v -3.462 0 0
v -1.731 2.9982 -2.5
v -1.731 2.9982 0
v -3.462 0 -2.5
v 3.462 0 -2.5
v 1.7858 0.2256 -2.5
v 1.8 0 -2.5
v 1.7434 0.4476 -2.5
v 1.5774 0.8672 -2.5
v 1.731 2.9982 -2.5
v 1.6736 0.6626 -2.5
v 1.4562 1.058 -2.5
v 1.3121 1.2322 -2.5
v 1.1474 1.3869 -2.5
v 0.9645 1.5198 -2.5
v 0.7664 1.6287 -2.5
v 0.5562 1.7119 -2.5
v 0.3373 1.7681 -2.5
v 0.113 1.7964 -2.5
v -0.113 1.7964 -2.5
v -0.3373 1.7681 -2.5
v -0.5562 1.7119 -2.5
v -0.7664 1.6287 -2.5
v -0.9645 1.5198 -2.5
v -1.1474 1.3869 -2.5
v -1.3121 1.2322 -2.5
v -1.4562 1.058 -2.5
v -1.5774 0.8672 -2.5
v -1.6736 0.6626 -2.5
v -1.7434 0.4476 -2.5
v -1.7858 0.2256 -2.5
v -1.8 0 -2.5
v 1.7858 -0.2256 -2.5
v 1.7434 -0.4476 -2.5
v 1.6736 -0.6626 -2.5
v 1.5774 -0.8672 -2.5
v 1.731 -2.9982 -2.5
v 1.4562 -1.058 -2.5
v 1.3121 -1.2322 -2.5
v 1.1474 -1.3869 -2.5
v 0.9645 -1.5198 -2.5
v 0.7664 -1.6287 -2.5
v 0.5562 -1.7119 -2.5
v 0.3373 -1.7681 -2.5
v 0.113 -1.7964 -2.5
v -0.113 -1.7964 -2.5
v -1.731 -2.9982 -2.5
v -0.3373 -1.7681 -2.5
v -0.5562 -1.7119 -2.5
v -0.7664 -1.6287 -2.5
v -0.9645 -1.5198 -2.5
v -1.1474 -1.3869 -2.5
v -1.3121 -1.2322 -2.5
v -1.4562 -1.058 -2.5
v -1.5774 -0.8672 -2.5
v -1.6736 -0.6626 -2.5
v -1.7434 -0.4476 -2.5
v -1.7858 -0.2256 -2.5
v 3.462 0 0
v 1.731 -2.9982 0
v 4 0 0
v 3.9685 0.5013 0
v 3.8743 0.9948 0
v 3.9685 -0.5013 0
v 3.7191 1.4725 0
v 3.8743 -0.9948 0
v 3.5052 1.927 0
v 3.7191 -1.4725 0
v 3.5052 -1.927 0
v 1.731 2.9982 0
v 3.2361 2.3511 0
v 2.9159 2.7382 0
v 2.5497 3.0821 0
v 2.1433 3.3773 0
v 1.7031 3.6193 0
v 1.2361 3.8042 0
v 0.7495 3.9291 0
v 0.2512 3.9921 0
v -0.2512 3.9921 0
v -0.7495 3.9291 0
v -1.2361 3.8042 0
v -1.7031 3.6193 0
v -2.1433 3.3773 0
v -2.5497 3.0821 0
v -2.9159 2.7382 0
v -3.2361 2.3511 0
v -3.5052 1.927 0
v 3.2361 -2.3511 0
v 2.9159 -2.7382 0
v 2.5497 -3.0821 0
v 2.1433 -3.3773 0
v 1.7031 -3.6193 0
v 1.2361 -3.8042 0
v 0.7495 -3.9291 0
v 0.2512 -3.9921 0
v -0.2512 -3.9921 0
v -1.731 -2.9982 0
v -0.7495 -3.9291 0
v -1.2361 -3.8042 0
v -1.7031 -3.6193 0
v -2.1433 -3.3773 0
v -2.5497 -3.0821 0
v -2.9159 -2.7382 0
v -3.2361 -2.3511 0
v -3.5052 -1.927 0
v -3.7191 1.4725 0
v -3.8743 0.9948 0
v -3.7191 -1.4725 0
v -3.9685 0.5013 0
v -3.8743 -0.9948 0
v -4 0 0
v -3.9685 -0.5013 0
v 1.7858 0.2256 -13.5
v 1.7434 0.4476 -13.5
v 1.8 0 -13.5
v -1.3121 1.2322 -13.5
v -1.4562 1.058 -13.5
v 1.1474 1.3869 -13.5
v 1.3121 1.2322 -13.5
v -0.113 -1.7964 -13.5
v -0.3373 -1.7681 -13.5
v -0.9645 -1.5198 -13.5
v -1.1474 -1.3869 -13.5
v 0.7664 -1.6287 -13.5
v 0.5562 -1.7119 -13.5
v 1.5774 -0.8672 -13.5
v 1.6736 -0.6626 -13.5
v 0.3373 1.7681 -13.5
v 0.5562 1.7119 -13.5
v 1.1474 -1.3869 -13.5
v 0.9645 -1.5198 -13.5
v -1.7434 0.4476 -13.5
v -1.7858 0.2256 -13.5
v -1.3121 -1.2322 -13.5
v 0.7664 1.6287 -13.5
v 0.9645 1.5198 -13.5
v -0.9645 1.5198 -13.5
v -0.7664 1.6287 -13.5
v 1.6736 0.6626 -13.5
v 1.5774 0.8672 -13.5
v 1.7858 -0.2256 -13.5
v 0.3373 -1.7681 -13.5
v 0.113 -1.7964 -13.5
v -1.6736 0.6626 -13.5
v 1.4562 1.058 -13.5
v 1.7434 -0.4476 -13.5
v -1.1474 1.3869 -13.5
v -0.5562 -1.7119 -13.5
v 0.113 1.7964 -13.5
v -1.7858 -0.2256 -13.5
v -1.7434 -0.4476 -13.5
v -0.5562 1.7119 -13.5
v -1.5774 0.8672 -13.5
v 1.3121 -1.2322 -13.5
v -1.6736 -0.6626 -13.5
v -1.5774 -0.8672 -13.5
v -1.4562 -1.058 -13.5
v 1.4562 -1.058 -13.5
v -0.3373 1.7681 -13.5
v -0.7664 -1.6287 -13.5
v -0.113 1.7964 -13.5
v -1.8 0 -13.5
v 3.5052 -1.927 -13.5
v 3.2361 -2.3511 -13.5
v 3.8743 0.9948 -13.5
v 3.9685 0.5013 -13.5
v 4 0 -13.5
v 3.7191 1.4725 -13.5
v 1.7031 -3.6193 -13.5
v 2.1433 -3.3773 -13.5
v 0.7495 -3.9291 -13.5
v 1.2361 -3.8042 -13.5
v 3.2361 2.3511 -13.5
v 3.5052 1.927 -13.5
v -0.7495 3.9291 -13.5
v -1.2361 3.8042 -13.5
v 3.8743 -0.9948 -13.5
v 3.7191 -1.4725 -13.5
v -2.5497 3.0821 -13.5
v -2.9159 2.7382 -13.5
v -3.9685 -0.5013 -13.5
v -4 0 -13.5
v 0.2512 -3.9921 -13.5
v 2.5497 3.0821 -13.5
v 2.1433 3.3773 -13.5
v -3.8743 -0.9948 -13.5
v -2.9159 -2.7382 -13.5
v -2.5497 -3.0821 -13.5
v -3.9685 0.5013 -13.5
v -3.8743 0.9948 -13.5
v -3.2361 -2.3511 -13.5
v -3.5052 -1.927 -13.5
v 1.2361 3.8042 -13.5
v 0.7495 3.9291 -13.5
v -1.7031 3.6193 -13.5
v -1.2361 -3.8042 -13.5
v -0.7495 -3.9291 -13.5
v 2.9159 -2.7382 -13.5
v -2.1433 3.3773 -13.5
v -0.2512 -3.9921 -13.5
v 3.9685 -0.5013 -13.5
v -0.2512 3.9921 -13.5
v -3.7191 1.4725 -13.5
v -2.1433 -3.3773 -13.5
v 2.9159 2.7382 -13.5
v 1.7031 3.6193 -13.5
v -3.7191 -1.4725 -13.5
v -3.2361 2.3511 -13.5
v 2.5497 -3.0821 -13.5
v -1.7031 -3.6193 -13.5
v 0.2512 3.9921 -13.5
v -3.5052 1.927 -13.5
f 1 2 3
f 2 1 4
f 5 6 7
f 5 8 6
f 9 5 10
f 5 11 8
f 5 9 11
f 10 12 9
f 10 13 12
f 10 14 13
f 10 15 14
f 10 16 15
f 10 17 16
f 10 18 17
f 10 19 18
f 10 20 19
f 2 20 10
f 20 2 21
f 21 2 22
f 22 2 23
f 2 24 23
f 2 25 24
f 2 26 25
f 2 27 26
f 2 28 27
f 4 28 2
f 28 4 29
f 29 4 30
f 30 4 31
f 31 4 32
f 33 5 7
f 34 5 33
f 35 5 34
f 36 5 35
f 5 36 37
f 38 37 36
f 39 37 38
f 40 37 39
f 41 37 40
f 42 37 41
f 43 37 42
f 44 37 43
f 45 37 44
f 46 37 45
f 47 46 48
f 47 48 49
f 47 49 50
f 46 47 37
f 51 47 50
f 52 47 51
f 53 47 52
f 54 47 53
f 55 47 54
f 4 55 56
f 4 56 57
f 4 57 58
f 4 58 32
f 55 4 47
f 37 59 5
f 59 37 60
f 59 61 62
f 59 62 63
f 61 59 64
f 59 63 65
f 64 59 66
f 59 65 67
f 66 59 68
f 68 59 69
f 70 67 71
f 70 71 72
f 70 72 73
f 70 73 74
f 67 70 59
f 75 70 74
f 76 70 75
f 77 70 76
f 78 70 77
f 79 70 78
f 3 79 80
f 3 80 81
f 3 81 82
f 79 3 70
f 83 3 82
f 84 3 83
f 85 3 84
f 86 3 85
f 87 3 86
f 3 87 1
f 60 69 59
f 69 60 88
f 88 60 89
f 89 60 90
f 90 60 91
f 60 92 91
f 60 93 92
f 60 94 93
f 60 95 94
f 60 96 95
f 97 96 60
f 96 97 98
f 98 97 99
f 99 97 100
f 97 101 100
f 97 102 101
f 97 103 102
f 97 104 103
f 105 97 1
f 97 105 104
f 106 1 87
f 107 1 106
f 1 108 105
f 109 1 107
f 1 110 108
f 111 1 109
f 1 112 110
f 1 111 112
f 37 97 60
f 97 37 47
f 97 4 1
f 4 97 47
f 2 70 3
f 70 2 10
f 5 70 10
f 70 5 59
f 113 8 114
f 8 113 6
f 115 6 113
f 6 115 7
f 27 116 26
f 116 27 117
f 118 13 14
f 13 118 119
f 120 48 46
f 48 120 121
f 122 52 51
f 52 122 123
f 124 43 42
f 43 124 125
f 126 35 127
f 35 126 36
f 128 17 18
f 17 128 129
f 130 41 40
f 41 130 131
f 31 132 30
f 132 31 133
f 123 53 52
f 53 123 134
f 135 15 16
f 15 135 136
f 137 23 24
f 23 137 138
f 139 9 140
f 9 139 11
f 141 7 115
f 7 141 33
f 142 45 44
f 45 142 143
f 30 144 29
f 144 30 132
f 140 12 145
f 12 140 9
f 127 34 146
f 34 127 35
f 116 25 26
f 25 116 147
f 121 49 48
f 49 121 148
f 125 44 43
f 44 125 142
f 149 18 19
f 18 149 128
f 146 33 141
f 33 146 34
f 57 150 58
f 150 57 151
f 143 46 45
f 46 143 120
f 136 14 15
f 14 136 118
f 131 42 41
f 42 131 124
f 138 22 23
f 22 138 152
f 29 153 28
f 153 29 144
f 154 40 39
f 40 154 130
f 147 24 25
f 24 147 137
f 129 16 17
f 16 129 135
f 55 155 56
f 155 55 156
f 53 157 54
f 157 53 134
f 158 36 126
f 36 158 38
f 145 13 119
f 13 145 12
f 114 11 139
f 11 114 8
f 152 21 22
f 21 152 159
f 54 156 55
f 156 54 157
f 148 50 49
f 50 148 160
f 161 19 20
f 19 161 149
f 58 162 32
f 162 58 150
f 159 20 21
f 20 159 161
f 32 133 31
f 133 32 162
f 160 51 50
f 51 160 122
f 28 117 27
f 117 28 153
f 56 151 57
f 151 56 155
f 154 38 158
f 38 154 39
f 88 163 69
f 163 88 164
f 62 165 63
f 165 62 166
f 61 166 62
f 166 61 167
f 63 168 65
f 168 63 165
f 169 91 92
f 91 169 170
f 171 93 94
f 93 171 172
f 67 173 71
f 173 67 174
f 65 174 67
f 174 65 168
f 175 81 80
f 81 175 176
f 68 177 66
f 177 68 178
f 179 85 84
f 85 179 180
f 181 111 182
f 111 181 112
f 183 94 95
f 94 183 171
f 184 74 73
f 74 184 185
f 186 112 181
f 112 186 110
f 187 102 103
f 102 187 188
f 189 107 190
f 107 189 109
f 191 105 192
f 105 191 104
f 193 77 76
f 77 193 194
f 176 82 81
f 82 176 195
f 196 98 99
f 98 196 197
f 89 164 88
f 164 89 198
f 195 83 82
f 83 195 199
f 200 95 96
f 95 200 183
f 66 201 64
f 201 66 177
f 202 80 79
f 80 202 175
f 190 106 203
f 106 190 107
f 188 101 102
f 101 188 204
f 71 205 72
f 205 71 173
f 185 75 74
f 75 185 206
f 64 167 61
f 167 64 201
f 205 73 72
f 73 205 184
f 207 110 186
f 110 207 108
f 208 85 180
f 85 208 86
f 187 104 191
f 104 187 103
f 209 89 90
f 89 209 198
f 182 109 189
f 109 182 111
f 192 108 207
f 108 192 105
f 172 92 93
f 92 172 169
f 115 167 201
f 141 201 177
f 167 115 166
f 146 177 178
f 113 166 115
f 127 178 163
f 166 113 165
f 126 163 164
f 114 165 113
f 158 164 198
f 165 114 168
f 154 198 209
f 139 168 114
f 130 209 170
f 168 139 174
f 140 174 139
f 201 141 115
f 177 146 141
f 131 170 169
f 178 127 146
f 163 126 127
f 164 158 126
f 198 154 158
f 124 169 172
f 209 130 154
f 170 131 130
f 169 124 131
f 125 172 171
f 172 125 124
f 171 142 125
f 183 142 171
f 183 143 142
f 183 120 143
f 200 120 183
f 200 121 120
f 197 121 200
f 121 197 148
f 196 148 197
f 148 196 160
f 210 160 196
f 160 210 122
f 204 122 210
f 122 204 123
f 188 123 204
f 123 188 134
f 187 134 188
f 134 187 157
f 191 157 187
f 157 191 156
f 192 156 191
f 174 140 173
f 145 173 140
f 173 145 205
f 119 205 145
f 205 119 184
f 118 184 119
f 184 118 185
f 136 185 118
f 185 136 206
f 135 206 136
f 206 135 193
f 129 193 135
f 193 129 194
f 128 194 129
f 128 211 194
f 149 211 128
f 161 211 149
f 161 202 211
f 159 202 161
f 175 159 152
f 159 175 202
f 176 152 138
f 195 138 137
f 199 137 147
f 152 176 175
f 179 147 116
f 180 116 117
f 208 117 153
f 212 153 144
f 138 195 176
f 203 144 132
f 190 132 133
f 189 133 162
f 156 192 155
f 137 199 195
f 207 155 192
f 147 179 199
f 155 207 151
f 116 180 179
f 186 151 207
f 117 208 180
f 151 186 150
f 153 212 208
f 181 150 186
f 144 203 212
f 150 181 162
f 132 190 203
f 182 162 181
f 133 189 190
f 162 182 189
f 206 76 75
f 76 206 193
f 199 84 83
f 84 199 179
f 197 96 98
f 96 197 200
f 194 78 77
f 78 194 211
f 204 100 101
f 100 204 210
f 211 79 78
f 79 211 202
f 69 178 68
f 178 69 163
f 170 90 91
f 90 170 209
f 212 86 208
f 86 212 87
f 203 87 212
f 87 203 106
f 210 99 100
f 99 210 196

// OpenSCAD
$fn = 50;

difference() {
	union() {
		translate(v = [0, 0, -13.5]) {
			cylinder(h = 13.5, r = 4.0);
		}
	}
	union() {
		translate(v = [0, 0, 0]) {
			rotate(a = [0, 0, 0]) {
				difference() {
					union() {
						translate(v = [0, 0, -2.5]) {
							linear_extrude(height = 2.5) {
								polygon(points = [[3.4619999999999997, 0.0], [1.7310000000000003, 2.9981799479017264], [-1.7309999999999992, 2.9981799479017264], [-3.4619999999999997, 4.2397272186481365e-16], [-1.7310000000000014, -2.998179947901726], [1.7309999999999977, -2.9981799479017277]]);
							}
						}
					}
					union();
				}
			}
		}
		#translate(v = [0, 0, -100.0]) {
			cylinder(h = 200, r = 1.8);
		}
	}
}
